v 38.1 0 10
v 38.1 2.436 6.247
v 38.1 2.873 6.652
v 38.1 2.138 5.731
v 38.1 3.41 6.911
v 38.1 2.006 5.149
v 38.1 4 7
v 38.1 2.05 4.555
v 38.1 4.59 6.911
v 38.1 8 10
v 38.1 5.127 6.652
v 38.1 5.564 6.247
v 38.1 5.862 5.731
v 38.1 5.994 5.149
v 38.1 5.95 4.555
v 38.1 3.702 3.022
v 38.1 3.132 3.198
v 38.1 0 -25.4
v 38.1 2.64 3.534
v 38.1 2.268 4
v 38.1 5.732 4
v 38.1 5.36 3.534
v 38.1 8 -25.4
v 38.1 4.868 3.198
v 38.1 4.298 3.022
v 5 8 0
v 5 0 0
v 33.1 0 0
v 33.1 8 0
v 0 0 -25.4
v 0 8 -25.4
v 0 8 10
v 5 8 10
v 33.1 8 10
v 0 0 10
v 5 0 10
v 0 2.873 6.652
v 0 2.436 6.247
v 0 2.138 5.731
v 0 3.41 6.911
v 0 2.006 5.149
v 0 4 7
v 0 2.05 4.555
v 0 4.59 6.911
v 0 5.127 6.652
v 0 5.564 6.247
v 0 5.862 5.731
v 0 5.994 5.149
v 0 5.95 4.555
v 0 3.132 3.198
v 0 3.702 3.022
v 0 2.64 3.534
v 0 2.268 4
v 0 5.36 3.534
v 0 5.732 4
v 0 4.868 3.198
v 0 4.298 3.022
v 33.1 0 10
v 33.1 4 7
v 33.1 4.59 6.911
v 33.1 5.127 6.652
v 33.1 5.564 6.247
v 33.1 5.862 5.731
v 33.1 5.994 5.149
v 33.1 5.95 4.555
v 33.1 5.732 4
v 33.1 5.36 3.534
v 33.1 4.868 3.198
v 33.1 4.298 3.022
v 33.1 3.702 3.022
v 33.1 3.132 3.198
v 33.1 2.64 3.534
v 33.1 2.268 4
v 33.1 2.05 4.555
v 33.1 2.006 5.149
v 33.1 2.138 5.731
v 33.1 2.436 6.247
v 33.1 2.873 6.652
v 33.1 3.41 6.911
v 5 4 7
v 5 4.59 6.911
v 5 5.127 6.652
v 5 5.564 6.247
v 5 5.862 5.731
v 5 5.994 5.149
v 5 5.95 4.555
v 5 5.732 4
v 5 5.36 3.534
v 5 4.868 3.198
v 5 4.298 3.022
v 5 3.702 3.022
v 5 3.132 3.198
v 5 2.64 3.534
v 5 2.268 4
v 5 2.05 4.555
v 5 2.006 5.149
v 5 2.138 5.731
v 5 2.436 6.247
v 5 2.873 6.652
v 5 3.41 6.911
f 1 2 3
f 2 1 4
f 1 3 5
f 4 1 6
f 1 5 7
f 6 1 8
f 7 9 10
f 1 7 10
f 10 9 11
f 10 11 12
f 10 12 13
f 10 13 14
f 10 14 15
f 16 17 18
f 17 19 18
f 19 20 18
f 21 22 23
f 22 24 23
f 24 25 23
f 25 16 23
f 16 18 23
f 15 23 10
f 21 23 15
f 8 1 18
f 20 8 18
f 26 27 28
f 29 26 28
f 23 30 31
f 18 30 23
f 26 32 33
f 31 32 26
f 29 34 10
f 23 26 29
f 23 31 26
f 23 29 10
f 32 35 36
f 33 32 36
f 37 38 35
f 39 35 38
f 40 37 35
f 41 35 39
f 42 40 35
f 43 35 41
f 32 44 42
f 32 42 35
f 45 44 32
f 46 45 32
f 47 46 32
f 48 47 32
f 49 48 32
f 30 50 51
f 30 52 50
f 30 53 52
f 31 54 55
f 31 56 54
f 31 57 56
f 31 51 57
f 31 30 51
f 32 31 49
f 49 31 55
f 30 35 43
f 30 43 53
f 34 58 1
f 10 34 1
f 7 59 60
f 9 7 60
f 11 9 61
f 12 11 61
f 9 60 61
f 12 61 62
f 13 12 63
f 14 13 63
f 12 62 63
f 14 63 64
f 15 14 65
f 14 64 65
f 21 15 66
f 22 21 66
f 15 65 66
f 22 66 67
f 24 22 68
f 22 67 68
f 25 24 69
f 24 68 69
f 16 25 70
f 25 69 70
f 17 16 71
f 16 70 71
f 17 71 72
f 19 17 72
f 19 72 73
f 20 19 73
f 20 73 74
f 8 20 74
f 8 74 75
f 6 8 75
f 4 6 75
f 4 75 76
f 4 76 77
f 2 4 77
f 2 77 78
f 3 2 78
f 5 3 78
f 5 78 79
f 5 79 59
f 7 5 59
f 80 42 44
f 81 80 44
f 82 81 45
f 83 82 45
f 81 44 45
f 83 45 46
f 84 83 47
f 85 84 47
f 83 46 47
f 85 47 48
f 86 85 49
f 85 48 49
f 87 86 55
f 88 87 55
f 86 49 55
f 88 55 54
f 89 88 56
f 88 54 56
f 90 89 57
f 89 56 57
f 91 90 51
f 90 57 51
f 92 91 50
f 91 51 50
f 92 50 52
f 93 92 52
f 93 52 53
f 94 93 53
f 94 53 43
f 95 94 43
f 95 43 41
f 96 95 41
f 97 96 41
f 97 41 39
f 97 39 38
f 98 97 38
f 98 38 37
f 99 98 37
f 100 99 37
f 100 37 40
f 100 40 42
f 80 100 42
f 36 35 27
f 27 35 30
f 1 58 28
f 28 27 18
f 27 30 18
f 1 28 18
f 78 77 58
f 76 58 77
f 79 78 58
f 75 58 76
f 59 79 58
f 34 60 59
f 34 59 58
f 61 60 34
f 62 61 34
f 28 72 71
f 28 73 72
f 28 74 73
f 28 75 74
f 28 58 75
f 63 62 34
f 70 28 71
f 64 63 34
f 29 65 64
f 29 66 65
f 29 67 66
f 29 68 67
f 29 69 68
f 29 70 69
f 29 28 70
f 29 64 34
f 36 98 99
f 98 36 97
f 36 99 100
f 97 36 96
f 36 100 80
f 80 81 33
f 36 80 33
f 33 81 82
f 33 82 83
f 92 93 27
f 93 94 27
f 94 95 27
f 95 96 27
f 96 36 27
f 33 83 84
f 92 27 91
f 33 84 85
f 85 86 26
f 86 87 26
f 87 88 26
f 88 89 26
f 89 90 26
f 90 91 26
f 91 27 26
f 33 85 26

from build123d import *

# Parameters (mm, degrees)
SKETCH1_W           = 38.1
SKETCH1_H           = 25.4
BOSS_EXTRUDE1_DEPTH = 8
SKETCH2_W           = 5
SKETCH2_H           = 8
BOSS_EXTRUDE2_DEPTH = 10
SKETCH3_R           = 2
CUT_EXTRUDE1_DEPTH  = 30
LPATTERN1_COUNT     = 2
LPATTERN1_PITCH     = 33.1


with BuildPart() as part:
    # Sketch1 → Boss-Extrude1 (new body)
    with BuildSketch(Plane(origin=(0, 0, 0), x_dir=(1, 0, 0), z_dir=(0, 1, 0))):
        with Locations((19.05, 12.7)):
            Rectangle(SKETCH1_W, SKETCH1_H)
    extrude(amount=BOSS_EXTRUDE1_DEPTH)

    # Sketch2 → Boss-Extrude2 (add)
    with BuildSketch(Plane.XY):
        with Locations((35.6, 4)):
            Rectangle(SKETCH2_W, SKETCH2_H)
    boss_extrude2 = extrude(amount=BOSS_EXTRUDE2_DEPTH)

    # Sketch3 → Cut-Extrude1 (cut)
    with BuildSketch(Plane.ZY.offset(-33.1)):
        with Locations((5, 4)):
            Circle(SKETCH3_R)
    cut_extrude1 = extrude(amount=-CUT_EXTRUDE1_DEPTH, mode=Mode.SUBTRACT)

    # LPattern1: Boss-Extrude2, Cut-Extrude1 ×2
    with Locations(*[(-i * LPATTERN1_PITCH, 0, 0) for i in range(1, LPATTERN1_COUNT)]):
        add(boss_extrude2)
        add(cut_extrude1, mode=Mode.SUBTRACT)


solid = part.part
